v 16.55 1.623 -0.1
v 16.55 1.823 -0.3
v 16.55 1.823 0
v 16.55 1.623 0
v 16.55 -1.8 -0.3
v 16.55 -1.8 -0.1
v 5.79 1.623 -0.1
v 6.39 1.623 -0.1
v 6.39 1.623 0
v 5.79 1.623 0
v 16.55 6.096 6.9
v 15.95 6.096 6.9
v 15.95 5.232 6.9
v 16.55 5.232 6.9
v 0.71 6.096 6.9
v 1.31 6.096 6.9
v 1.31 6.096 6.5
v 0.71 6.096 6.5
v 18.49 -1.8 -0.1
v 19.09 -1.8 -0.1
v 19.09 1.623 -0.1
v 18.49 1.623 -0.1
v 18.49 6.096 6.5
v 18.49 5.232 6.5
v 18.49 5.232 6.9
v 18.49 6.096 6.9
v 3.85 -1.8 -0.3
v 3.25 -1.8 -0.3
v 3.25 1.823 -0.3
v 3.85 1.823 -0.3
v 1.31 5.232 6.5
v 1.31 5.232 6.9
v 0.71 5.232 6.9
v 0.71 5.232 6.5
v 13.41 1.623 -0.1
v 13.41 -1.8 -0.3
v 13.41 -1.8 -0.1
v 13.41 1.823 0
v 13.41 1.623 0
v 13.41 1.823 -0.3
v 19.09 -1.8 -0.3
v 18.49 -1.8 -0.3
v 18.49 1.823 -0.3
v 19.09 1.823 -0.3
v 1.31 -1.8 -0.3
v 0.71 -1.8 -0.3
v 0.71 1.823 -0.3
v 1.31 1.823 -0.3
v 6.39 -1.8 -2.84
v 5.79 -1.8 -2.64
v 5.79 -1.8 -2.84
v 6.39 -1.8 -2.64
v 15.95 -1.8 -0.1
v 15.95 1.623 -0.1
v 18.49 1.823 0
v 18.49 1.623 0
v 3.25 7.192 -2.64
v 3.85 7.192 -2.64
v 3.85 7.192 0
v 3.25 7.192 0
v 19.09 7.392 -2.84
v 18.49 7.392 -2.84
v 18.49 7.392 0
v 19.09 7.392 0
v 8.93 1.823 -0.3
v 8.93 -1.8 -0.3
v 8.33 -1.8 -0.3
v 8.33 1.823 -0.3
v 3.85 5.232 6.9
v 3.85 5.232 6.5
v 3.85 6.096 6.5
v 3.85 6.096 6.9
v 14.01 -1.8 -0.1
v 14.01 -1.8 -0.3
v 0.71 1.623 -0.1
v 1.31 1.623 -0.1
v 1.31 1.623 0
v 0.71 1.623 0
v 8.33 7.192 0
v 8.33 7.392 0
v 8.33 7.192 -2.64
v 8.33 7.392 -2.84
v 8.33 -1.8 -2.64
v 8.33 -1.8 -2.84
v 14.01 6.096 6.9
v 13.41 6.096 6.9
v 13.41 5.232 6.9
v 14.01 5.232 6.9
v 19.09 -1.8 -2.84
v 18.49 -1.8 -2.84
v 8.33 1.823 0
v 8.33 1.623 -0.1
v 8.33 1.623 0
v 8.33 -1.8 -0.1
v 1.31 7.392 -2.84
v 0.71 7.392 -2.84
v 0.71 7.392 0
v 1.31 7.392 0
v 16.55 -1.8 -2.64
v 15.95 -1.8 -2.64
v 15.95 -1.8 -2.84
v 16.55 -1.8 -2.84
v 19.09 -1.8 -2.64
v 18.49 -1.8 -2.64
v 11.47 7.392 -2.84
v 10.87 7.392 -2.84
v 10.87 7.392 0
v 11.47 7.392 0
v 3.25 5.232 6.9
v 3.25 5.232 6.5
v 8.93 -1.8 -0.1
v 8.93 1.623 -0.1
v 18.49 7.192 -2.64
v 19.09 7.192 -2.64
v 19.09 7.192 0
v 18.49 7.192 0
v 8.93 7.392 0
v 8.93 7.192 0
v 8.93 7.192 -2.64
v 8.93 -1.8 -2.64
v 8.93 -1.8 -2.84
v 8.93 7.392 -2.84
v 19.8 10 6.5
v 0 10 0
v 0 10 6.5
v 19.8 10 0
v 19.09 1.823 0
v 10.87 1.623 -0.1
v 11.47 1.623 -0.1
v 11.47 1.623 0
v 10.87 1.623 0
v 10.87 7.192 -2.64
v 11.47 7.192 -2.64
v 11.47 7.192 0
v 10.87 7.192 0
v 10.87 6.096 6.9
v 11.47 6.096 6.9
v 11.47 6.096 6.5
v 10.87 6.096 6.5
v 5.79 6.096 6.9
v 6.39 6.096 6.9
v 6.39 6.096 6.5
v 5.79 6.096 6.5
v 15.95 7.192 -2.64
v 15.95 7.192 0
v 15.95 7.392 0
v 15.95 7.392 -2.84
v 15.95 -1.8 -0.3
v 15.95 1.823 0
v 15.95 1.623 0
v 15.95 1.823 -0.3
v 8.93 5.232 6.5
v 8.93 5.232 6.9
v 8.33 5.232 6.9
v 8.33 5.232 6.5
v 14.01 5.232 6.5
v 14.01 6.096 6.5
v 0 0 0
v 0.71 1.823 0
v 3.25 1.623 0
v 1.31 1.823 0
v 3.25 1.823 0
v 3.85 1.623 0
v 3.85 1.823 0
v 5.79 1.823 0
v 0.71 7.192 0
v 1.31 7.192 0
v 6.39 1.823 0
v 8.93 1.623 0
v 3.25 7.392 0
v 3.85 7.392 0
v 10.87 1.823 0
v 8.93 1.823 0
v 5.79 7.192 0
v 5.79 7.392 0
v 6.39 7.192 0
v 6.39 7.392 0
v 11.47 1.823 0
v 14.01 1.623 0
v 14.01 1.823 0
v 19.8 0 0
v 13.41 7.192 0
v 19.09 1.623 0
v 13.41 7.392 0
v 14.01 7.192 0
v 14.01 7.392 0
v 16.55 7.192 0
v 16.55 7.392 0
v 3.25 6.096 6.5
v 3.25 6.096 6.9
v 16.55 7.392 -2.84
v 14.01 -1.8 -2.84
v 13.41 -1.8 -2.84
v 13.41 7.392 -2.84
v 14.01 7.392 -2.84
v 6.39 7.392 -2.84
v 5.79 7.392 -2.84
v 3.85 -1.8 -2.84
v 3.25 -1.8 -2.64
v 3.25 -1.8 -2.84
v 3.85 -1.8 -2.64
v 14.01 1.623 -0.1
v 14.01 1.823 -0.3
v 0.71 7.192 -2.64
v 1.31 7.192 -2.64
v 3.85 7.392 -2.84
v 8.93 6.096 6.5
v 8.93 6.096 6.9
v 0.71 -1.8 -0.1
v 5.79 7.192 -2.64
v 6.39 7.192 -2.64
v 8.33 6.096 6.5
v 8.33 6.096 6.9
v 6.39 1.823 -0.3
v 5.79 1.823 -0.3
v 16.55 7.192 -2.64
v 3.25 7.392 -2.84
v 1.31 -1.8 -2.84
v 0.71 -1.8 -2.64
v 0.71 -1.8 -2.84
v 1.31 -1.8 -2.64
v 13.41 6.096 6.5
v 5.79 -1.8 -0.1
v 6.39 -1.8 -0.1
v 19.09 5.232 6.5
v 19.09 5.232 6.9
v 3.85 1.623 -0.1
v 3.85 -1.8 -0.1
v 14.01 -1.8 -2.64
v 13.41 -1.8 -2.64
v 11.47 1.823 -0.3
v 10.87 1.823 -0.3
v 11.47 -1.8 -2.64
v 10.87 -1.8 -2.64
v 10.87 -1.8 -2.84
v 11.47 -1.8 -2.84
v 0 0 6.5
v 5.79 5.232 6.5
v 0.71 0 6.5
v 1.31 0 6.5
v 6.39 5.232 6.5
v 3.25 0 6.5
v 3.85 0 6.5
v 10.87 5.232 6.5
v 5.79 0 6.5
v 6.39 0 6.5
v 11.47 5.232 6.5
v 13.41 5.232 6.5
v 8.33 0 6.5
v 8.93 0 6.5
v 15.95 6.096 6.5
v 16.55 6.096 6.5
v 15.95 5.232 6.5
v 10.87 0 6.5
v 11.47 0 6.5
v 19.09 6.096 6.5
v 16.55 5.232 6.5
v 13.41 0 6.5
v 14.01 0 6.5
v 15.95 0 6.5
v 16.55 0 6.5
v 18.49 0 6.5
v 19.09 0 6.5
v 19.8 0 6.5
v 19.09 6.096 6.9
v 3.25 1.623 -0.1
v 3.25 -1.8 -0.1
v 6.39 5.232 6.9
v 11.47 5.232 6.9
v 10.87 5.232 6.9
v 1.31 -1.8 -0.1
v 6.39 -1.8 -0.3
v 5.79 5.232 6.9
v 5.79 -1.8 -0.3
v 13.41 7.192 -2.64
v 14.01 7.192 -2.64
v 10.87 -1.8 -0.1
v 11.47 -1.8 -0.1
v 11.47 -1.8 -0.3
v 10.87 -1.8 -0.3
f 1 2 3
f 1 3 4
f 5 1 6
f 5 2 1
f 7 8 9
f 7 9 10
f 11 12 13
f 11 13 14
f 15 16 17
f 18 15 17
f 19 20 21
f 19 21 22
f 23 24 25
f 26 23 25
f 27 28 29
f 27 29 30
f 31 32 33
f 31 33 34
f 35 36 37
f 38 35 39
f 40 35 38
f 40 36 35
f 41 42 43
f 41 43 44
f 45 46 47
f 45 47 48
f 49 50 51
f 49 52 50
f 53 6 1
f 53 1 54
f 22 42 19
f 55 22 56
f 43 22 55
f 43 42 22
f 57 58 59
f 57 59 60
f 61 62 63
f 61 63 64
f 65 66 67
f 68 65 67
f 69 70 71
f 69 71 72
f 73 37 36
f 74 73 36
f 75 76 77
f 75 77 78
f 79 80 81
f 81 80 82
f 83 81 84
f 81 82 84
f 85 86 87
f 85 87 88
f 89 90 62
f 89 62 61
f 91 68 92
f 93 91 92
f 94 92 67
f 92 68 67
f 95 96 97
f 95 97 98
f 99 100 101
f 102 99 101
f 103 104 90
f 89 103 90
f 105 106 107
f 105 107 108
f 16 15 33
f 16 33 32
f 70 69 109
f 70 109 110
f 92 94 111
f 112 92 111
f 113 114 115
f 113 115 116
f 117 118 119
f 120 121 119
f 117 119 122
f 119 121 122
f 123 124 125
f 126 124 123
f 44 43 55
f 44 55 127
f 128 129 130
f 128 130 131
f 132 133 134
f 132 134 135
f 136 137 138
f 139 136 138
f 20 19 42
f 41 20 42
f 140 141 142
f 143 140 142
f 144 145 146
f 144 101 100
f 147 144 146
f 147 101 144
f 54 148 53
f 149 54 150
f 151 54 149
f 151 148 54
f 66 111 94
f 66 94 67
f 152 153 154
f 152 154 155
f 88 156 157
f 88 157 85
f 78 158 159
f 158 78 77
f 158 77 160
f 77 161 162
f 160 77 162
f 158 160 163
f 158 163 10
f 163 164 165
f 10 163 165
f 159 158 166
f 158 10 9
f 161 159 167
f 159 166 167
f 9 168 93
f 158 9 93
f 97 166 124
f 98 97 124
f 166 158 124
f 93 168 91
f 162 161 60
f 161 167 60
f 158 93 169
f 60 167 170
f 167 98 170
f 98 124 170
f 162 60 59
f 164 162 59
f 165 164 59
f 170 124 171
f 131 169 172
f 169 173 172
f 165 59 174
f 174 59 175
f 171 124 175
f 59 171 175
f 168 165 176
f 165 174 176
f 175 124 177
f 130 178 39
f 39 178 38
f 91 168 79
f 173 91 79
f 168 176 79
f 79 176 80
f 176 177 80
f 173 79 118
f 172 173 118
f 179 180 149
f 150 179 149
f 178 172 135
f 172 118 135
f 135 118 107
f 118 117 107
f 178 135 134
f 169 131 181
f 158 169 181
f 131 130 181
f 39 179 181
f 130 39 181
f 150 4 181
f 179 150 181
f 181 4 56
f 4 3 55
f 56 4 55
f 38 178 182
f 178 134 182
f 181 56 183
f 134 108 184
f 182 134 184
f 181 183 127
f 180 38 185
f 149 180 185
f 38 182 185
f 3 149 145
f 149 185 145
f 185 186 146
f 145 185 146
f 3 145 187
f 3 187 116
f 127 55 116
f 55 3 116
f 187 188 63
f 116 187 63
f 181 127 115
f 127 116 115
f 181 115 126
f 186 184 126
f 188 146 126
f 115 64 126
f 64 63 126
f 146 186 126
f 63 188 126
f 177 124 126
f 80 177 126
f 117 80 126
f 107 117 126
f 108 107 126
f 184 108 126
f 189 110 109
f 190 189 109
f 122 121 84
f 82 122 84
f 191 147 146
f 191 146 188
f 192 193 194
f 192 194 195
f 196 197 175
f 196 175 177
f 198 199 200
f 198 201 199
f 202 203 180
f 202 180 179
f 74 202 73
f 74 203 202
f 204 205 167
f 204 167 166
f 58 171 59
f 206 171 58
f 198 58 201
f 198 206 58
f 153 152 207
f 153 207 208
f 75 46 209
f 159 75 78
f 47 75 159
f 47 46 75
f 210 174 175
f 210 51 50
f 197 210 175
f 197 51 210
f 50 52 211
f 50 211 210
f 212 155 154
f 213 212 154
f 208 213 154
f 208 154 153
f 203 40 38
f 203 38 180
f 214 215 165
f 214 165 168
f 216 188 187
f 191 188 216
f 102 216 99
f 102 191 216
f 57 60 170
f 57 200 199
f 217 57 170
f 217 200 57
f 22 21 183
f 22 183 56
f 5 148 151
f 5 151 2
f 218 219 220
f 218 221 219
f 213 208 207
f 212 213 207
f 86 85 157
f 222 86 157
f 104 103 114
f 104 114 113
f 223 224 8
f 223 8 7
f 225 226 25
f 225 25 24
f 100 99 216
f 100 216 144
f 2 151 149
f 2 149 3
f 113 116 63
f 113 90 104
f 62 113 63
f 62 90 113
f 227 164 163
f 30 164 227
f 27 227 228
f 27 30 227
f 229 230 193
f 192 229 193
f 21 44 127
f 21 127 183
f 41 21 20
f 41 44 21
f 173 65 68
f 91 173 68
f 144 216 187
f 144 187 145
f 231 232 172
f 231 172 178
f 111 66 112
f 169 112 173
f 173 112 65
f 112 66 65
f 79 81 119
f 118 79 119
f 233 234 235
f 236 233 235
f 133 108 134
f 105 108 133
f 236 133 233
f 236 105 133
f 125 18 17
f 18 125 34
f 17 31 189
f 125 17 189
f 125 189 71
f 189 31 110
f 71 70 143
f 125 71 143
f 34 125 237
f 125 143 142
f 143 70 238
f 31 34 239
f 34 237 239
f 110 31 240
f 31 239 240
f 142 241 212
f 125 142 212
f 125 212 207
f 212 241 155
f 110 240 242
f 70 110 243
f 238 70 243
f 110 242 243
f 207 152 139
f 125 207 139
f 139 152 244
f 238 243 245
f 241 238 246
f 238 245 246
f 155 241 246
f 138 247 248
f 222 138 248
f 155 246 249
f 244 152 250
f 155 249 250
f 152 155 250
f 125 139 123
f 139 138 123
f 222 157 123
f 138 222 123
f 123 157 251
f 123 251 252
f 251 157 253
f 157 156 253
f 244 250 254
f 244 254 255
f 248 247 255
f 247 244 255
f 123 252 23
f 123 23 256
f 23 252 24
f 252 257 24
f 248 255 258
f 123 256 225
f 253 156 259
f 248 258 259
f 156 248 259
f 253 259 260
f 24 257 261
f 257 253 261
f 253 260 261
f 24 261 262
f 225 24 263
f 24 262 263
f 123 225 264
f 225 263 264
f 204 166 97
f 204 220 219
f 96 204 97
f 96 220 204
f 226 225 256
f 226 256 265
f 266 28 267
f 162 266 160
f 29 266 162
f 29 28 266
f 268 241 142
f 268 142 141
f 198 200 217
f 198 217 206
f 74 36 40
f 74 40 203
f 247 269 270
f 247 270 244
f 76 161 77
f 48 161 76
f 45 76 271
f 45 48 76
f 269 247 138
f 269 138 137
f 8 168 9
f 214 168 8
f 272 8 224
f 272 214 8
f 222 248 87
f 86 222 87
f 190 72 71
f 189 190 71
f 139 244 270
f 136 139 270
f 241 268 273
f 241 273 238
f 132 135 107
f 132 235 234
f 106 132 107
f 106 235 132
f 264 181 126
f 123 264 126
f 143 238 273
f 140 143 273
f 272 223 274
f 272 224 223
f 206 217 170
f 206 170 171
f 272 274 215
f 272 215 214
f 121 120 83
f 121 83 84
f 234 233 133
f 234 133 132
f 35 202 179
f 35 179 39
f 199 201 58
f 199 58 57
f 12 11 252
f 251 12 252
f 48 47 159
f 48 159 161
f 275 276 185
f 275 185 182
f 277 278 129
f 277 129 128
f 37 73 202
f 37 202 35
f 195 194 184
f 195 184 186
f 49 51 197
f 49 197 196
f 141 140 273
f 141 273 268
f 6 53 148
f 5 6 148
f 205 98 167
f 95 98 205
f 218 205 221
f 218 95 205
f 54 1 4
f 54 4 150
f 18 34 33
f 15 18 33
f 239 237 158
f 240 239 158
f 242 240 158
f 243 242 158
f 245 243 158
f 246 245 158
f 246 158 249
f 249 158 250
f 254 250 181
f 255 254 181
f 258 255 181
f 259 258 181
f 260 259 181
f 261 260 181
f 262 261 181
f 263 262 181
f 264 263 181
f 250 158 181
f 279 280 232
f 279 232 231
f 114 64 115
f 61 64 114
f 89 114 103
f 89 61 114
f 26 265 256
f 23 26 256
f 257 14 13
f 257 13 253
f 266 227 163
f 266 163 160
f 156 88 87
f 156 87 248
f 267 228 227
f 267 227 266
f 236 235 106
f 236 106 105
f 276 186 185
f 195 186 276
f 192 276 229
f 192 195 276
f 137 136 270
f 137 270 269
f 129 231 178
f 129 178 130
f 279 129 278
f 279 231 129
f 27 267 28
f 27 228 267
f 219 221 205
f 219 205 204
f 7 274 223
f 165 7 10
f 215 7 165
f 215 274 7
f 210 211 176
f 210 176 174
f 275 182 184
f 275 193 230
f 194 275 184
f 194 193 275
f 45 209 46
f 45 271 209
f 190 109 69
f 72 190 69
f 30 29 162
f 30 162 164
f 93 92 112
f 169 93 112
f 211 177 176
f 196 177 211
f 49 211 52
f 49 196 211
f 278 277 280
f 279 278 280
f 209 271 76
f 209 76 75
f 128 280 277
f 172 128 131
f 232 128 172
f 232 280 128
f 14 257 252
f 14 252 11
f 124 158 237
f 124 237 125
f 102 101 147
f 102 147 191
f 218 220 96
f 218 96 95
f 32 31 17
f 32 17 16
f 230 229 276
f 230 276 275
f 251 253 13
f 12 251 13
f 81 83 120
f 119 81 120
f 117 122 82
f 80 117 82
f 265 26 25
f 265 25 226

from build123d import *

# Parameters (mm, degrees)
SKETCH_1_W               = 19.8
SKETCH_1_H               = 10
EXTRUDE_1_DEPTH          = 6.9
SKETCH_2_W               = 0.6
SKETCH_2_H               = 0.2
PATTERN_LINEAR_1_COUNT   = 4
PATTERN_LINEAR_1_PITCH   = 2.54
MIRROR_1_COPY_1_SKETCH_W = 0.6
MIRROR_1_COPY_1_SKETCH_H = 0.2
MIRROR_1_COPY_2_SKETCH_W = 0.6
MIRROR_1_COPY_2_SKETCH_H = 0.2
MIRROR_1_COPY_3_SKETCH_W = 0.6
MIRROR_1_COPY_3_SKETCH_H = 0.2
SKETCH_5_W               = 0.6
SKETCH_5_H               = 0.2
PATTERN_LINEAR_2_COUNT   = 4
PATTERN_LINEAR_2_PITCH   = 2.54
MIRROR_2_COPY_1_SKETCH_W = 0.6
MIRROR_2_COPY_1_SKETCH_H = 0.2
MIRROR_2_COPY_2_SKETCH_W = 0.6
MIRROR_2_COPY_2_SKETCH_H = 0.2
MIRROR_2_COPY_3_SKETCH_W = 0.6
MIRROR_2_COPY_3_SKETCH_H = 0.2
MIRROR_2_COPY_4_SKETCH_W = 0.6
MIRROR_2_COPY_4_SKETCH_H = 0.2
SKETCH_7_W               = 0.71
SKETCH_7_H               = 0.4
SKETCH_7_W_2             = 1.94
CUT_EXTRUDE_1_DEPTH      = 24.230368056
SKETCH_8_W               = 0.4
SKETCH_8_H               = 3.904109304
SKETCH_8_H_2             = 5.232387761
CUT_EXTRUDE_2_DEPTH      = 24.230368056


with BuildPart() as part:
    # 草图1 → 凸台-拉伸1 (new body)
    with BuildSketch(Plane.XY):
        with Locations((9.9, 5)):
            Rectangle(SKETCH_1_W, SKETCH_1_H)
    extrude(amount=EXTRUDE_1_DEPTH)

    # 扫描2: sweep along a path in 草图3
    with BuildLine(Plane(origin=(11.17, 0, 0), x_dir=(0, 0, -1), z_dir=(1, 0, 0))) as sweep_2_path:
        Line((0, 2.022879956), (0.5, 2.022879956))
        Line((0.5, 2.022879956), (0.5, -1.8))
    # 草图2 → 扫描2 (sweep)
    with BuildSketch(Plane(origin=(0, 0, 0), x_dir=(-1, 0, 0), z_dir=(0, 0, -1))):
        with Locations((-11.17, 1.72257922)):
            Rectangle(SKETCH_2_W, SKETCH_2_H)
    sweep_2 = sweep(path=sweep_2_path.line, transition=Transition.RIGHT)

    # 阵列(线性)1: 扫描2 ×4
    with Locations(*[(i * PATTERN_LINEAR_1_PITCH, 0, 0) for i in range(1, PATTERN_LINEAR_1_COUNT)]):
        add(sweep_2)

    # 镜向1: 扫描2 across plane
    add(sweep_2.mirror(Plane(origin=(9.9, 0, 0), x_dir=(0, 0, 1), z_dir=(1, 0, 0))))

    # 镜向1 copy 1: sweep along a path in 镜向1 copy 1 path
    with BuildLine(Plane(origin=(6.09, 0, 0), x_dir=(0, 0, -1), z_dir=(-1, 0, 0))) as mirror_1_copy_1_path:
        Line((0, -2.022879956), (0.5, -2.022879956))
        Line((0.5, -2.022879956), (0.5, 1.8))
    # 镜向1 copy 1 sketch → 镜向1 copy 1 (sweep)
    with BuildSketch(Plane(origin=(17.26, 0, 0), x_dir=(1, 0, 0), z_dir=(0, 0, -1))):
        with Locations((-11.17, -1.72257922)):
            Rectangle(MIRROR_1_COPY_1_SKETCH_W, MIRROR_1_COPY_1_SKETCH_H)
    sweep(path=mirror_1_copy_1_path.line, transition=Transition.RIGHT)

    # 镜向1 copy 2: sweep along a path in 镜向1 copy 2 path
    with BuildLine(Plane(origin=(3.55, 0, 0), x_dir=(0, 0, -1), z_dir=(-1, 0, 0))) as mirror_1_copy_2_path:
        Line((0, -2.022879956), (0.5, -2.022879956))
        Line((0.5, -2.022879956), (0.5, 1.8))
    # 镜向1 copy 2 sketch → 镜向1 copy 2 (sweep)
    with BuildSketch(Plane(origin=(14.72, 0, 0), x_dir=(1, 0, 0), z_dir=(0, 0, -1))):
        with Locations((-11.17, -1.72257922)):
            Rectangle(MIRROR_1_COPY_2_SKETCH_W, MIRROR_1_COPY_2_SKETCH_H)
    sweep(path=mirror_1_copy_2_path.line, transition=Transition.RIGHT)

    # 镜向1 copy 3: sweep along a path in 镜向1 copy 3 path
    with BuildLine(Plane(origin=(1.01, 0, 0), x_dir=(0, 0, -1), z_dir=(-1, 0, 0))) as mirror_1_copy_3_path:
        Line((0, -2.022879956), (0.5, -2.022879956))
        Line((0.5, -2.022879956), (0.5, 1.8))
    # 镜向1 copy 3 sketch → 镜向1 copy 3 (sweep)
    with BuildSketch(Plane(origin=(12.18, 0, 0), x_dir=(1, 0, 0), z_dir=(0, 0, -1))):
        with Locations((-11.17, -1.72257922)):
            Rectangle(MIRROR_1_COPY_3_SKETCH_W, MIRROR_1_COPY_3_SKETCH_H)
    sweep(path=mirror_1_copy_3_path.line, transition=Transition.RIGHT)

    # 扫描3: sweep along a path in 草图6
    with BuildLine(Plane(origin=(11.17, 0, 0), x_dir=(0, 0, -1), z_dir=(1, 0, 0))) as sweep_3_path:
        Line((0, 7.391909702), (2.839699264, 7.391909702))
        Line((2.839699264, 7.391909702), (2.839699264, -1.8))
    # 草图5 → 扫描3 (sweep)
    with BuildSketch(Plane(origin=(0, 0, 0), x_dir=(-1, 0, 0), z_dir=(0, 0, -1))):
        with Locations((-11.17, 7.291909702)):
            Rectangle(SKETCH_5_W, SKETCH_5_H)
    sweep_3 = sweep(path=sweep_3_path.line, transition=Transition.RIGHT)

    # 阵列(线性)2: 扫描3 ×4
    with Locations(*[(i * PATTERN_LINEAR_2_PITCH, 0, 0) for i in range(1, PATTERN_LINEAR_2_COUNT)]):
        add(sweep_3)

    # 镜向2 copy 1: sweep along a path in 镜向2 copy 1 path
    with BuildLine(Plane(origin=(6.09, 0, 0), x_dir=(0, 0, -1), z_dir=(-1, 0, 0))) as mirror_2_copy_1_path:
        Line((0, -7.391909702), (2.839699264, -7.391909702))
        Line((2.839699264, -7.391909702), (2.839699264, 1.8))
    # 镜向2 copy 1 sketch → 镜向2 copy 1 (sweep)
    with BuildSketch(Plane(origin=(17.26, 0, 0), x_dir=(1, 0, 0), z_dir=(0, 0, -1))):
        with Locations((-11.17, -7.291909702)):
            Rectangle(MIRROR_2_COPY_1_SKETCH_W, MIRROR_2_COPY_1_SKETCH_H)
    sweep(path=mirror_2_copy_1_path.line, transition=Transition.RIGHT)

    # 镜向2 copy 2: sweep along a path in 镜向2 copy 2 path
    with BuildLine(Plane(origin=(3.55, 0, 0), x_dir=(0, 0, -1), z_dir=(-1, 0, 0))) as mirror_2_copy_2_path:
        Line((0, -7.391909702), (2.839699264, -7.391909702))
        Line((2.839699264, -7.391909702), (2.839699264, 1.8))
    # 镜向2 copy 2 sketch → 镜向2 copy 2 (sweep)
    with BuildSketch(Plane(origin=(14.72, 0, 0), x_dir=(1, 0, 0), z_dir=(0, 0, -1))):
        with Locations((-11.17, -7.291909702)):
            Rectangle(MIRROR_2_COPY_2_SKETCH_W, MIRROR_2_COPY_2_SKETCH_H)
    sweep(path=mirror_2_copy_2_path.line, transition=Transition.RIGHT)

    # 镜向2 copy 3: sweep along a path in 镜向2 copy 3 path
    with BuildLine(Plane(origin=(1.01, 0, 0), x_dir=(0, 0, -1), z_dir=(-1, 0, 0))) as mirror_2_copy_3_path:
        Line((0, -7.391909702), (2.839699264, -7.391909702))
        Line((2.839699264, -7.391909702), (2.839699264, 1.8))
    # 镜向2 copy 3 sketch → 镜向2 copy 3 (sweep)
    with BuildSketch(Plane(origin=(12.18, 0, 0), x_dir=(1, 0, 0), z_dir=(0, 0, -1))):
        with Locations((-11.17, -7.291909702)):
            Rectangle(MIRROR_2_COPY_3_SKETCH_W, MIRROR_2_COPY_3_SKETCH_H)
    sweep(path=mirror_2_copy_3_path.line, transition=Transition.RIGHT)

    # 镜向2 copy 4: sweep along a path in 镜向2 copy 4 path
    with BuildLine(Plane(origin=(8.63, 0, 0), x_dir=(0, 0, -1), z_dir=(-1, 0, 0))) as mirror_2_copy_4_path:
        Line((0, -7.391909702), (2.839699264, -7.391909702))
        Line((2.839699264, -7.391909702), (2.839699264, 1.8))
    # 镜向2 copy 4 sketch → 镜向2 copy 4 (sweep)
    with BuildSketch(Plane(origin=(19.8, 0, 0), x_dir=(1, 0, 0), z_dir=(0, 0, -1))):
        with Locations((-11.17, -7.291909702)):
            Rectangle(MIRROR_2_COPY_4_SKETCH_W, MIRROR_2_COPY_4_SKETCH_H)
    sweep(path=mirror_2_copy_4_path.line, transition=Transition.RIGHT)

    # 草图7 → 切除-拉伸1 (cut, through all)
    with BuildSketch(Plane.XZ):
        with Locations((0.355, 6.7)):
            Rectangle(SKETCH_7_W, SKETCH_7_H)
        with Locations((2.28, 6.7)):
            Rectangle(SKETCH_7_W_2, SKETCH_7_H)
        with Locations((4.82, 6.7)):
            Rectangle(SKETCH_7_W_2, SKETCH_7_H)
        with Locations((9.9, 6.7)):
            Rectangle(SKETCH_7_W_2, SKETCH_7_H)
        with Locations((7.36, 6.7)):
            Rectangle(SKETCH_7_W_2, SKETCH_7_H)
        with Locations((12.44, 6.7)):
            Rectangle(SKETCH_7_W_2, SKETCH_7_H)
        with Locations((14.98, 6.7)):
            Rectangle(SKETCH_7_W_2, SKETCH_7_H)
        with Locations((17.52, 6.7)):
            Rectangle(SKETCH_7_W_2, SKETCH_7_H)
        with Locations((19.445, 6.7)):
            Rectangle(SKETCH_7_W, SKETCH_7_H)
    extrude(amount=-CUT_EXTRUDE_1_DEPTH, mode=Mode.SUBTRACT)

    # 草图8 → 切除-拉伸2 (cut, through all)
    with BuildSketch(Plane(origin=(19.8, 0, 0), x_dir=(0, 0, -1), z_dir=(1, 0, 0))):
        with Locations((-6.7, 8.047945348)):
            Rectangle(SKETCH_8_W, SKETCH_8_H)
        with Locations((-6.7, 2.616193881)):
            Rectangle(SKETCH_8_W, SKETCH_8_H_2)
    extrude(amount=-CUT_EXTRUDE_2_DEPTH, mode=Mode.SUBTRACT)


solid = part.part
